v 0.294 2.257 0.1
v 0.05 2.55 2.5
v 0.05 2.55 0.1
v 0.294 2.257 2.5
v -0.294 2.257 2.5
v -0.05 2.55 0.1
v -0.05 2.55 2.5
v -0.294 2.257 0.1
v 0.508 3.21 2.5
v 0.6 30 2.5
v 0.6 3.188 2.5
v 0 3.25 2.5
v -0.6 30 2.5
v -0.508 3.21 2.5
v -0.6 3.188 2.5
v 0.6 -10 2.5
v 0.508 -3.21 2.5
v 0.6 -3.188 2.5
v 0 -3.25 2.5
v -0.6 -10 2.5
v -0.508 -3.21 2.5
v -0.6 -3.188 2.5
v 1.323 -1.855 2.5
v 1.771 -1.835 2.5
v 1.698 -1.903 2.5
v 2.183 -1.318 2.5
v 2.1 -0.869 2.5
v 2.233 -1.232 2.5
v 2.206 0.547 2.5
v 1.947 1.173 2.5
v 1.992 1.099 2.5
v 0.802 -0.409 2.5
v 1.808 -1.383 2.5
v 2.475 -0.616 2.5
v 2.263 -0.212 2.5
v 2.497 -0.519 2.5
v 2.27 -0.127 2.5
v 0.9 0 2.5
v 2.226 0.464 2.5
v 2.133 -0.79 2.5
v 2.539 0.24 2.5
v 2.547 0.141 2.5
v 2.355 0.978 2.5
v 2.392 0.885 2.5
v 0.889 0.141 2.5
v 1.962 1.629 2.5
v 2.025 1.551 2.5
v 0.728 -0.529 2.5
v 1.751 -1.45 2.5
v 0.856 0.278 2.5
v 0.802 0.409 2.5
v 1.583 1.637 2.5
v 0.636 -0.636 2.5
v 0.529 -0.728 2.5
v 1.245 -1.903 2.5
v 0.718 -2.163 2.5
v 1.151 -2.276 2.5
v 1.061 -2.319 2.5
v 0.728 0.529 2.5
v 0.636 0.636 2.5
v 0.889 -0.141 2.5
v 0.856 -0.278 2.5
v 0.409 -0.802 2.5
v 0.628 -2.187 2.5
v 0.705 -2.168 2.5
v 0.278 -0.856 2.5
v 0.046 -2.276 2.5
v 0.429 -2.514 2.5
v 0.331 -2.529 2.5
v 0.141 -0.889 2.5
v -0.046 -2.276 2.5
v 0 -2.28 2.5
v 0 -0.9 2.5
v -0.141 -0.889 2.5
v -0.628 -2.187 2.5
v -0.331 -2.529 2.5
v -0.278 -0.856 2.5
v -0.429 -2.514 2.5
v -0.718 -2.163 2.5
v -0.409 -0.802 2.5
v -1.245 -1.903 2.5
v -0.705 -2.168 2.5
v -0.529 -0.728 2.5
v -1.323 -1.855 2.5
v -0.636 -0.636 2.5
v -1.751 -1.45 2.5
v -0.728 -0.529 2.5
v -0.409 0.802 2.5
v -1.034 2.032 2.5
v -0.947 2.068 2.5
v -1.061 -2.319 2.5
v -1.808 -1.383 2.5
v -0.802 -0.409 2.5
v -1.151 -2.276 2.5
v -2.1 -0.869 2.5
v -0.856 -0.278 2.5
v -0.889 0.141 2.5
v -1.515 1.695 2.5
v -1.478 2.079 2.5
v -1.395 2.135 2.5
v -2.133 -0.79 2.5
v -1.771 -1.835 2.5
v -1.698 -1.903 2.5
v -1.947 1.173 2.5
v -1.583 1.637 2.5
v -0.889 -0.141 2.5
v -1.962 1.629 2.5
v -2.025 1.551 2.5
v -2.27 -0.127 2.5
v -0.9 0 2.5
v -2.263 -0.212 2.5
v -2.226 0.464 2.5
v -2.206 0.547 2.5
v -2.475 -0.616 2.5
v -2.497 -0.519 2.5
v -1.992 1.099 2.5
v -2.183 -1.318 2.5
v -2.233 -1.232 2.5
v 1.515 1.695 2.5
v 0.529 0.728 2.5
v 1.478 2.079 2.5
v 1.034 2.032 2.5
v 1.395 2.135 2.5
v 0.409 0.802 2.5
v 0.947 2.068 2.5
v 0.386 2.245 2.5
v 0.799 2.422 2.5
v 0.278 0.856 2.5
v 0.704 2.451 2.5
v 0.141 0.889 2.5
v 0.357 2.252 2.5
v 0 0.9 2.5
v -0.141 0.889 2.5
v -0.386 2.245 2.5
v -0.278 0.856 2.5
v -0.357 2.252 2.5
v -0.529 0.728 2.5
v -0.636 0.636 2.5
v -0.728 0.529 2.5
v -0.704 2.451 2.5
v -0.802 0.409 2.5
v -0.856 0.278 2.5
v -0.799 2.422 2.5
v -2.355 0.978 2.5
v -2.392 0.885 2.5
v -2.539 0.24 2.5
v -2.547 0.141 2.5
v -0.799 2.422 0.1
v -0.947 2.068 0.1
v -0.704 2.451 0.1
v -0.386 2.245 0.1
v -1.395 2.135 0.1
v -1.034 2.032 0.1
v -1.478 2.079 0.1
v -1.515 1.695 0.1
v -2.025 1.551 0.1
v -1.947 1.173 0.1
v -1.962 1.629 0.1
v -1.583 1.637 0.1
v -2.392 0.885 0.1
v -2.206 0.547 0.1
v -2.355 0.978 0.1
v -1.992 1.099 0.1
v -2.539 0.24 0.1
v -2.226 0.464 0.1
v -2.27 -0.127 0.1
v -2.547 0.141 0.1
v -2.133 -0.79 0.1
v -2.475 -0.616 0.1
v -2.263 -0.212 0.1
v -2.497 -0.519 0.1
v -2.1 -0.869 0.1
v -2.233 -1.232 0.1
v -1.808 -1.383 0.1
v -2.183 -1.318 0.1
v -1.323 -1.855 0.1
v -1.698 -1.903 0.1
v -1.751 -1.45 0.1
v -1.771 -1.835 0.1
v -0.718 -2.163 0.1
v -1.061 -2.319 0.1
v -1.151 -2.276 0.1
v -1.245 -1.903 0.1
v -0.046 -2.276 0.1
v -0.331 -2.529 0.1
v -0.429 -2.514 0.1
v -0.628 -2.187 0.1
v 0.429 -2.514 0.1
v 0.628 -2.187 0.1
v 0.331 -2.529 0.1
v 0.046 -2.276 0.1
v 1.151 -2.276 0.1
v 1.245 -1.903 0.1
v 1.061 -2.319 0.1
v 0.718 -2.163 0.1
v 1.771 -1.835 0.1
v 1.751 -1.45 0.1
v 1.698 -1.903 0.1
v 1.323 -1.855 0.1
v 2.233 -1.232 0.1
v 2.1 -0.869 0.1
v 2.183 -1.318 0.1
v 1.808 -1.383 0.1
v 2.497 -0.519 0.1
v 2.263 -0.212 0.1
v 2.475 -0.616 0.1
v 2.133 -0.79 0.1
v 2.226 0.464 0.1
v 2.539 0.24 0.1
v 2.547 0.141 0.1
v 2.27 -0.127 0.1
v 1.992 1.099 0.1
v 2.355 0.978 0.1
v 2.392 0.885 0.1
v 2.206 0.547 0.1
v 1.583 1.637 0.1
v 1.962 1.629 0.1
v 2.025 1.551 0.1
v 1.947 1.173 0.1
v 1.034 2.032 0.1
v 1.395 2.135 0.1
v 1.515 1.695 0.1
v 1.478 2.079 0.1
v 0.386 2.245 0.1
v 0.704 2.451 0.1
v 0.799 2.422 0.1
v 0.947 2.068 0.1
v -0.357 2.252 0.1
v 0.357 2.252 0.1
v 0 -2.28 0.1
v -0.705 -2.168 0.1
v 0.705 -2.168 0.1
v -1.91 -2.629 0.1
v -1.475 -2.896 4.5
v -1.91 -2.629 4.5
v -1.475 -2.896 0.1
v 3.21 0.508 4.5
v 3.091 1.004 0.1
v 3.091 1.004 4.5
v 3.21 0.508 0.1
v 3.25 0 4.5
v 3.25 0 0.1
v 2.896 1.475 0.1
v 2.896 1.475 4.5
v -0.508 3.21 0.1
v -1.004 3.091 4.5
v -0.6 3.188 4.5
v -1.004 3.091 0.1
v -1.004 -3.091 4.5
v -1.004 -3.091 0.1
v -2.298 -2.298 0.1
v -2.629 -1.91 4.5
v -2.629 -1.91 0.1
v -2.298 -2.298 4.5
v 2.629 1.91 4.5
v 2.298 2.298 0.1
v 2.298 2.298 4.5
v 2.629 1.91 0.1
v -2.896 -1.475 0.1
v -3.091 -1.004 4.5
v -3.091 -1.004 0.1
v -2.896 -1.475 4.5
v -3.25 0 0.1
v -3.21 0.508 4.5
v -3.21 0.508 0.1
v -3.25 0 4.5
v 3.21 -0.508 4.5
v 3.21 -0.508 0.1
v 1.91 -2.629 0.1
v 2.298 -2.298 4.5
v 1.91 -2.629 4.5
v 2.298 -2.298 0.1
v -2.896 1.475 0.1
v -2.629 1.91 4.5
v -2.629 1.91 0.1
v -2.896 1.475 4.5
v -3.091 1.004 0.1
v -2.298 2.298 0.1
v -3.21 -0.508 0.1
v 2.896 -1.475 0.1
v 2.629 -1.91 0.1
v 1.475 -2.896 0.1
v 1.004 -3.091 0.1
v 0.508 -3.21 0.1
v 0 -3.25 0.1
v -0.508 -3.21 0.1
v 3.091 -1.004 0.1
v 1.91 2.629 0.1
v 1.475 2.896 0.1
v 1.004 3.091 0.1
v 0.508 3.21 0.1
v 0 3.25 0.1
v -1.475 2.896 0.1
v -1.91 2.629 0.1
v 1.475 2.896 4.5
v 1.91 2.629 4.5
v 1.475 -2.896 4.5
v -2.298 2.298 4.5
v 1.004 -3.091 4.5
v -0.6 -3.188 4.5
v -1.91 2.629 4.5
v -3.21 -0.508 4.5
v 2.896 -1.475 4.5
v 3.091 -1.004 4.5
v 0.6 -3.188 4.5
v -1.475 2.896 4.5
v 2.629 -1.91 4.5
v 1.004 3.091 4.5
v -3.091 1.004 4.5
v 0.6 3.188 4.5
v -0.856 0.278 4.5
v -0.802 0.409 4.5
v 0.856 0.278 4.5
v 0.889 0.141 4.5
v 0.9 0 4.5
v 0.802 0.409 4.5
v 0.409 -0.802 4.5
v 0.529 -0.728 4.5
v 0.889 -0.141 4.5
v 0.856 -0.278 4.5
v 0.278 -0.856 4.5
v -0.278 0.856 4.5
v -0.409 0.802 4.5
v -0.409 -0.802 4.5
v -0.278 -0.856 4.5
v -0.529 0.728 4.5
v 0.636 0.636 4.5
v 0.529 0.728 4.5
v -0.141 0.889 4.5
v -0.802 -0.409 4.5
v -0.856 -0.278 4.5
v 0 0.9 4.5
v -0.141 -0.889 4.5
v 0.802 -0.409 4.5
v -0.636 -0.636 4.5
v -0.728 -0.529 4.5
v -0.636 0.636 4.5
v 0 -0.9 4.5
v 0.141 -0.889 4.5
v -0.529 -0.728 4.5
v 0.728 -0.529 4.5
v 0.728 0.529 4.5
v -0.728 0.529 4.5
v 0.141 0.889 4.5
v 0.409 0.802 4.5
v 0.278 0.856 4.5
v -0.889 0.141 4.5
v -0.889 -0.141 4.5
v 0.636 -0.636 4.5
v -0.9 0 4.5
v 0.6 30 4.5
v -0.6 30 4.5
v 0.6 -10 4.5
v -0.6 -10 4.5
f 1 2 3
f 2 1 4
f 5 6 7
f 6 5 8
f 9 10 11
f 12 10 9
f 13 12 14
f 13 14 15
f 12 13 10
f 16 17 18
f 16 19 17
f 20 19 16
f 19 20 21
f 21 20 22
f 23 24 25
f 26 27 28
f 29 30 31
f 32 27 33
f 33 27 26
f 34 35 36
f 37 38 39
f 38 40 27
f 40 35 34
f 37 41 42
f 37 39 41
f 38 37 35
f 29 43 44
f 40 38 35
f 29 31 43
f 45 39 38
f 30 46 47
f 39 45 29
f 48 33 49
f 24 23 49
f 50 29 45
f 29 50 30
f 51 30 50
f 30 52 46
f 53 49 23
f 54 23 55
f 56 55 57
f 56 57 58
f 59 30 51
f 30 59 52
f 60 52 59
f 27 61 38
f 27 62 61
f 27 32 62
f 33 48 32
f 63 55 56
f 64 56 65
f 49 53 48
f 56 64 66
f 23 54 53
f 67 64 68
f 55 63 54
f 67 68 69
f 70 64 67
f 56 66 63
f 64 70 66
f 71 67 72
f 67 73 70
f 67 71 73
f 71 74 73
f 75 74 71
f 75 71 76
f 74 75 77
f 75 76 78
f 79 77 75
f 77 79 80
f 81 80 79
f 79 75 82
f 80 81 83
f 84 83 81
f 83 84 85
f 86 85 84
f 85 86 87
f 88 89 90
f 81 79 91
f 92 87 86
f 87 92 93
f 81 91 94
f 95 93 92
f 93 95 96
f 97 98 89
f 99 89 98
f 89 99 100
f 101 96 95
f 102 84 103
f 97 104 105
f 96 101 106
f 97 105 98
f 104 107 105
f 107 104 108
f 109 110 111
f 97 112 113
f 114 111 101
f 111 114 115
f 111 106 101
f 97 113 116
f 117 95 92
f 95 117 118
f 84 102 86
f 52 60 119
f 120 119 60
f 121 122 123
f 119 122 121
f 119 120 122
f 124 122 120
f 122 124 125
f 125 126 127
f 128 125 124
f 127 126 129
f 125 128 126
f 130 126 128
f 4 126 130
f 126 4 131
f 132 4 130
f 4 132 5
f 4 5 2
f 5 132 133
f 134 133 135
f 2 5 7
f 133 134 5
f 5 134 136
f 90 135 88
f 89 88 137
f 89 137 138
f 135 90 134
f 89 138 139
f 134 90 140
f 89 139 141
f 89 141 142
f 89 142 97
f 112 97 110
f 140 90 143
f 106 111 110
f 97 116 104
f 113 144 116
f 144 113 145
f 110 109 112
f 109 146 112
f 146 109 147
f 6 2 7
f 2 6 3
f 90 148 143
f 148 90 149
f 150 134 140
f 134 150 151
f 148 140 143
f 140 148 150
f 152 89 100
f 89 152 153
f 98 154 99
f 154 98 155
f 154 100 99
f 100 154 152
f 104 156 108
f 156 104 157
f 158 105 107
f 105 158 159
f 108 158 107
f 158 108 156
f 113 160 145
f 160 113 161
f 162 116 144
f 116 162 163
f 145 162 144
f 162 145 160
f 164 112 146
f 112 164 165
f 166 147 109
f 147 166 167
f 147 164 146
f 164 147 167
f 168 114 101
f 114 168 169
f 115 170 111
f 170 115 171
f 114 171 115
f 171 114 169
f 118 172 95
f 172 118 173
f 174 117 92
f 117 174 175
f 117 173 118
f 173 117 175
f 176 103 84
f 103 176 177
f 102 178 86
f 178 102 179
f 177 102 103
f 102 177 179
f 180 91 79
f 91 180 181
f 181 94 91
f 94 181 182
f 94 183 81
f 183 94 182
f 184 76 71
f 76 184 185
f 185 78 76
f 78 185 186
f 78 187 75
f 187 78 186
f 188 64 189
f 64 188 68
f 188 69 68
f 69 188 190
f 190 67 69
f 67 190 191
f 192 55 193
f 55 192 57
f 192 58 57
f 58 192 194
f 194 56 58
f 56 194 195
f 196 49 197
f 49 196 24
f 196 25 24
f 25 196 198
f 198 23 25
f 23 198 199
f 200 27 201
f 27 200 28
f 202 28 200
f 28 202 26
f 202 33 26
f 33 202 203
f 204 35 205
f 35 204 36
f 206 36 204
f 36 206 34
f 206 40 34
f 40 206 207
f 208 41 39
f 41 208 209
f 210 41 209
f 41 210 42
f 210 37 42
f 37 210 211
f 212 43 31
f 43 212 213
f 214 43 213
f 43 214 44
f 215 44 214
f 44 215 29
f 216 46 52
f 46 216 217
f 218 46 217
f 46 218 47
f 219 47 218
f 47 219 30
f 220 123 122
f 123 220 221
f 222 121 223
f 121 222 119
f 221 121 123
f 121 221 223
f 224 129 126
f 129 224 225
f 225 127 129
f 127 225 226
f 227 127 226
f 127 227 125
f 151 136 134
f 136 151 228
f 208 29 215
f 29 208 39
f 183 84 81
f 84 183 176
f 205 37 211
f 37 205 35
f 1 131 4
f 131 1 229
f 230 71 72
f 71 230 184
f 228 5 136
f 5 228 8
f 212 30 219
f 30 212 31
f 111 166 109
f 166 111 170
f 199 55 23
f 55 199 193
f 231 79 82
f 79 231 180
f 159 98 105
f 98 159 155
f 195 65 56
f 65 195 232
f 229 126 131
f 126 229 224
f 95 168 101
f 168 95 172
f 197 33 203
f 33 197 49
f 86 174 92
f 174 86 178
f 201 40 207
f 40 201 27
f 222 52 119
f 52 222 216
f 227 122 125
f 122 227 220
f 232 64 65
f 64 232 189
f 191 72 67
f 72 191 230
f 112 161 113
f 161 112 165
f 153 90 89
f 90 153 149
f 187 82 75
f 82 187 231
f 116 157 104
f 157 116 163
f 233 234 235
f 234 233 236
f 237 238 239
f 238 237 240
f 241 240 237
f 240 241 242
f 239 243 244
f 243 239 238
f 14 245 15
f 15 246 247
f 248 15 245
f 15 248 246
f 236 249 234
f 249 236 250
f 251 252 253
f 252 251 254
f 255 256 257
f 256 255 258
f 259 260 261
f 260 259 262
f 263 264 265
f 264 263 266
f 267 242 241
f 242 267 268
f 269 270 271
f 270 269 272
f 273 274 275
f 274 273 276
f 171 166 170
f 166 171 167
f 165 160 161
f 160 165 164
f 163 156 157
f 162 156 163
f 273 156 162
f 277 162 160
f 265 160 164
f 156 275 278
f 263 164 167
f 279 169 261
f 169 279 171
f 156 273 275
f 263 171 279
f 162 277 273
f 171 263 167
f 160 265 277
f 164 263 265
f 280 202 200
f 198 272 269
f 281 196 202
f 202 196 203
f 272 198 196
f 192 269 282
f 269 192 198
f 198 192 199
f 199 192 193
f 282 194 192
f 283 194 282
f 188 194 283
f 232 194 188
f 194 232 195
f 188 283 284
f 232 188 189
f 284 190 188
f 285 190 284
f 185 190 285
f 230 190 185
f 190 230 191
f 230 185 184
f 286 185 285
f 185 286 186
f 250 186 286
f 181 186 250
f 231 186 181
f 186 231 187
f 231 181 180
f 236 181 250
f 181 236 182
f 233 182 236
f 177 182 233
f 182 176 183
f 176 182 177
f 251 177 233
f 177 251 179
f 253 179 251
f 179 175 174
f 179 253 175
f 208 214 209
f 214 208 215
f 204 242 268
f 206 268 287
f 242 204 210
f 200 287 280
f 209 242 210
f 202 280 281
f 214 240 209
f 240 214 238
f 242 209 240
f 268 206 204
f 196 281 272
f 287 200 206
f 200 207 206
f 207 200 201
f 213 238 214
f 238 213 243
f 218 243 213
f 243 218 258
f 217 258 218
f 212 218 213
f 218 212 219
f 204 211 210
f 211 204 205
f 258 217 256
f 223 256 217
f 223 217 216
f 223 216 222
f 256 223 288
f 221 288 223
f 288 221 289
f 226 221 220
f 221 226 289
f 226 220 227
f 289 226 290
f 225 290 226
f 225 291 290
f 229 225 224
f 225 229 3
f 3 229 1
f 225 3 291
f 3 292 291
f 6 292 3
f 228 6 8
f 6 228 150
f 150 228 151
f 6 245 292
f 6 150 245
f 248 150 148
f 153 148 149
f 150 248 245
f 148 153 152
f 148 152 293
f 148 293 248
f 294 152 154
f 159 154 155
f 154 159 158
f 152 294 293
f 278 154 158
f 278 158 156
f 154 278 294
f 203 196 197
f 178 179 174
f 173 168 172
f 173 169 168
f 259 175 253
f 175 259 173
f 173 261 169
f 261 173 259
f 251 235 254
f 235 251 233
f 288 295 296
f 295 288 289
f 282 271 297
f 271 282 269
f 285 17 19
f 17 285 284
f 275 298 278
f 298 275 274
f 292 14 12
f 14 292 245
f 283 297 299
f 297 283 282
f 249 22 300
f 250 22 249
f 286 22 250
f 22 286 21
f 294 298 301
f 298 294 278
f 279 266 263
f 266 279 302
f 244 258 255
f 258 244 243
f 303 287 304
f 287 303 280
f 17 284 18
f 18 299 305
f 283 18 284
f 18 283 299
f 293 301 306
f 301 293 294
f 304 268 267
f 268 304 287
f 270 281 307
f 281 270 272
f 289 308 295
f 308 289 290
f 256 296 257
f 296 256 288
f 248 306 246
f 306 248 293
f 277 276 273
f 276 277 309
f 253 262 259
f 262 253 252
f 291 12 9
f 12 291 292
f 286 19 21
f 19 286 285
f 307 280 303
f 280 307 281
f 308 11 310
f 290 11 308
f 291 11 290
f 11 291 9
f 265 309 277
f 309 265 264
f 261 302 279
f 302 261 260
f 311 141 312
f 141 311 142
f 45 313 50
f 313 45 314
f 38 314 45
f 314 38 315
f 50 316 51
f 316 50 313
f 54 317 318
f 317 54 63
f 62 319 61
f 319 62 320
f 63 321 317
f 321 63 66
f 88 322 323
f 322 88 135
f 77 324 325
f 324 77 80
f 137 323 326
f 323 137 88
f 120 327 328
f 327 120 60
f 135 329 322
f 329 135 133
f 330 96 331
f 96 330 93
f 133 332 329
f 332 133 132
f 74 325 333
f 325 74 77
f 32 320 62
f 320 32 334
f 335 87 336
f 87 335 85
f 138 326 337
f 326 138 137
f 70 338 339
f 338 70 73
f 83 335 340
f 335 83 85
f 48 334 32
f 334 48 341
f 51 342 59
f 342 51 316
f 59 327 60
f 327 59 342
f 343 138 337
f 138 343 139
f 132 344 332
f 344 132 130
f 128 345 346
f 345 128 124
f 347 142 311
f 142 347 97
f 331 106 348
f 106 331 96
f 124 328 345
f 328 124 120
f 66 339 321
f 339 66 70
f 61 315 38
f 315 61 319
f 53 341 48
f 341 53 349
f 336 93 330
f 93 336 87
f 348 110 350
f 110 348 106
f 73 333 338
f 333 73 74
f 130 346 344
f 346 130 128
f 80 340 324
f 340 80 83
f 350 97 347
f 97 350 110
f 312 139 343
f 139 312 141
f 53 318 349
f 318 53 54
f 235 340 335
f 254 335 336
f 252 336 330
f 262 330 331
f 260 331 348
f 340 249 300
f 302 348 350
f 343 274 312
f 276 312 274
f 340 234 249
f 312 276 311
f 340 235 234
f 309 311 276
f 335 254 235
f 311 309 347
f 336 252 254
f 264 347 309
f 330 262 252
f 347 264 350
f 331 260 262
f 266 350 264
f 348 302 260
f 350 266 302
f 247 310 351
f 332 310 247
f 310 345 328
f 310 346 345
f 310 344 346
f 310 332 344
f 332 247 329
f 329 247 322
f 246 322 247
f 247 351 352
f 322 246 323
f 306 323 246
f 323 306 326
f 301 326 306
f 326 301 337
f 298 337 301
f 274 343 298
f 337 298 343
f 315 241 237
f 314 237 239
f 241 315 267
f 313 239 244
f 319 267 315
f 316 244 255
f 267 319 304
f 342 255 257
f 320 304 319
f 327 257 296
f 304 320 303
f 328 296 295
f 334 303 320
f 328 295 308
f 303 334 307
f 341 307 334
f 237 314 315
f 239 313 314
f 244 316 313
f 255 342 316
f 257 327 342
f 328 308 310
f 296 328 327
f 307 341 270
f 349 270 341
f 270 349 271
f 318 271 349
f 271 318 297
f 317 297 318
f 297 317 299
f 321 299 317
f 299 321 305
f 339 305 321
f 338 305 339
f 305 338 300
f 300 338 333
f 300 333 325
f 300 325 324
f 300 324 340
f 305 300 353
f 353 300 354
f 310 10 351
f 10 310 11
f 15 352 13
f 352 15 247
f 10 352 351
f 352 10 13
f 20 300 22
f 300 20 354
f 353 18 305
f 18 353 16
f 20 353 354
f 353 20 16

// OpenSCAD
/**
 *  Parametric servo arm generator for OpenScad
 *  Générateur de palonnier de servo pour OpenScad
 *
 *  Copyright (c) 2012 Charles Rincheval.  All rights reserved.
 *
 *  This library is free software; you can redistribute it and/or
 *  modify it under the terms of the GNU Lesser General Public
 *  License as published by the Free Software Foundation; either
 *  version 2.1 of the License, or (at your option) any later version.
 *
 *  This library is distributed in the hope that it will be useful,
 *  but WITHOUT ANY WARRANTY; without even the implied warranty of
 *  MERCHANTABILITY or FITNESS FOR A PARTICULAR PURPOSE.  See the GNU
 *  Lesser General Public License for more details.
 *
 *  You should have received a copy of the GNU Lesser General Public
 *  License along with this library; if not, write to the Free Software
 *  Foundation, Inc., 51 Franklin St, Fifth Floor, Boston, MA  02110-1301  USA
 *
 *  Last update :
 *  https://github.com/hugokernel/OpenSCAD_ServoArms
 *
 *  http://www.digitalspirit.org/
 */

$fn = 40;

/**
 *  Clear between arm head and servo head
 *  With PLA material, use clear : 0.3, for ABS, use 0.2
 */
SERVO_HEAD_CLEAR = 0.3;

/**
 *  Head / Tooth parameters
 *  Futaba 3F Standard Spline
 *  http://www.servocity.com/html/futaba_servo_splines.html
 *
 *  First array (head related) :
 *  0. Head external diameter
 *  1. Head heigth
 *  2. Head thickness
 *  3. Head screw diameter
 *
 *  Second array (tooth related) :
 *  0. Tooth count
 *  1. Tooth height
 *  2. Tooth length
 *  3. Tooth width
 */
FUTABA_3F_SPLINE = [
    [5.92, 4, 1.1, 2.5],
    [25, 0.3, 0.7, 0.1]
];

module servo_futaba_3f(length, count) {
    servo_arm(FUTABA_3F_SPLINE, [length, count]);
}

SG90_SPLINE = [
  [4.5, 2.5, 1, 1.8 /* 0 */],
  [21, 0.3, 0.6, 0.1]
];

module servo_sg90(length, count) {
    servo_arm(SG90_SPLINE, [length, count]);
}

/**
 *  If you want to support a new servo, juste add a new spline definition array
 *  and a module named like servo_XXX_YYY where XXX is servo brand and YYY is the
 *  connection type (3f) or the servo type (s3003)
 */

module servo_standard(length, count) {
    servo_futaba_3f(length, count);
}

/**
 *  Tooth
 *
 *    |<-w->|
 *    |_____|___
 *    /     \  ^h
 *  _/       \_v
 *   |<--l-->|
 *
 *  - tooth length (l)
 *  - tooth width (w)
 *  - tooth height (h)
 *  - height
 *
 */
module servo_head_tooth(length, width, height, head_height) {
    linear_extrude(height = head_height) {
        polygon([[-length / 2, 0], [-width / 2, height], [width / 2, height], [length / 2,0]]);
    }
}

/**
 *  Servo head
 */
module servo_head(params, clear = SERVO_HEAD_CLEAR) {

    head = params[0];
    tooth = params[1];

    head_diameter = head[0];
    head_height = head[1];
    //head_heigth

    tooth_count = tooth[0];
    tooth_height = tooth[1];
    tooth_length = tooth[2];
    tooth_width = tooth[3];

    % cylinder(r = head_diameter / 2, h = head_height + 1);

    cylinder(r = head_diameter / 2 - tooth_height + 0.03 + clear, h = head_height);

    for (i = [0 : tooth_count]) {
        rotate([0, 0, i * (360 / tooth_count)]) {
            translate([0, head_diameter / 2 - tooth_height + clear, 0]) {
                servo_head_tooth(tooth_length, tooth_width, tooth_height, head_height);
            }
        }
    }
}

/**
 *  Servo hold
 *  - Head / Tooth parameters
 *  - Arms params (length and count)
 */
module servo_arm(params, arms) {

    head = params[0];
    tooth = params[1];

    head_diameter = head[0];
    head_height = head[1];
    head_thickness = head[2];
    head_screw_diameter = head[3];

    tooth_length = tooth[2];
    tooth_width = tooth[3];

    arm_length = arms[0];
    arm_count = 1; //arms[1];

    /**
     *  Servo arm
     *  - length is from center to last hole
     */
    module arm(tooth_length, tooth_width, reinforcement_height, head_height, hole_count = 1) {
        echo(tooth_length,tooth_width,reinforcement_height,head_height,hole_count);
        arm_screw_diameter = 2;

        difference() {
            union() {
                cylinder(r = tooth_width / 2, h = head_height);

                linear_extrude(height = head_height) {
                    polygon([
                        [-tooth_width / 2, 0], [-tooth_width / 60, tooth_length],
                        [tooth_width / 60, tooth_length], [tooth_width / 2, 0]
                    ]);
                }

                translate([0, tooth_length, 0]) {
                    cylinder(r = tooth_width / 60, h = head_height);
                }

                if (tooth_length >= 1200) {
                    translate([-head_height / 2 + 2, head_diameter / 2 + head_thickness - 0.5, -4]) {
                        rotate([90, 0, 0]) {
                            rotate([0, -90, 0]) {
                                linear_extrude(height = head_height) {
                                    polygon([
                                        [-tooth_length / 1.7, 4], [0, 4], [0, - reinforcement_height + 5],
                                        [-2, - reinforcement_height + 5]
                                    ]);
                                }
                            }
                        }
                    }
                }
            }

            // Hole
            for (i = [0 : hole_count - 1]) {
                //translate([0, length - (length / hole_count * i), -1]) {
                translate([0, tooth_length - (4 * i), -1]) {
                    //cylinder(r = arm_screw_diameter / 2, h = 10);
                }
            }

            cylinder(r = head_screw_diameter / 2, h = 10);
        }
    }

    difference() {
        translate([0, 0, 0.1]) {
            cylinder(r = head_diameter / 2 + head_thickness, h = head_height + 1);
        }

        cylinder(r = head_screw_diameter / 2, h = 10);

        servo_head(params);
    }

    arm_thickness = head_thickness;

    // Arm
    translate([0, 0, head_height]) {
        for (i = [0 : arm_count - 1]) {
            rotate([0, 0, i * (360 / arm_count)]) {
                arm(arm_length, head_diameter + arm_thickness * 2, head_height, 2);
            }
        }
    }
}



/**
 *  Servo hold
 *  - Head / Tooth parameters
 *  - Arms params (length and count)
 */
module servo_arm2(params, arms) {

    head = params[0];
    tooth = params[1];

    head_diameter = head[0];
    head_height = head[1];
    head_thickness = head[2];
    head_screw_diameter = head[3];

    tooth_length = tooth[2];
    tooth_width = tooth[3];

    arm_length = arms[0];
    arm_count = 2;

    /**
     *  Servo arm
     *  - length is from center to last hole
     */
    module arm(arm_length) {
        // arm_length, head_diameter + arm_thickness * 2, head_height, 2
        echo(head_thickness);
        tooth_length=arm_length;
        tooth_width=1.2;// + head_thickness * 2;
        reinforcement_height=head_height;
        head_height=2;
        arm_screw_diameter = 2;
        arm_end_w=0.6;
        echo(tooth_length,tooth_width,reinforcement_height,head_height);


        difference() {
            union() {
                
                cylinder(r = head_diameter/2 + head_thickness, h = head_height);

                linear_extrude(height = head_height) {
                    polygon([
                        [-tooth_width / 2, 0], [-arm_end_w, tooth_length],
                        [arm_end_w, tooth_length], [tooth_width / 2, 0]
                    ]);
                }


            }

            cylinder(r = head_screw_diameter / 2, h = 10);
        }
    }

    difference() {
        // outer main head
        translate([0, 0, 0.1]) {
            cylinder(r = head_diameter / 2 + head_thickness, h = head_height + 1);
        }
        // cut screw hole
        cylinder(r = head_screw_diameter / 2, h = 10);
        // cut screw head
        servo_head(params);
    }


    // Arm
    arm_lengths=[arm_length,arm_length/3];
    translate([0, 0, head_height]) {
        for (i = [0 : arm_count - 1]) {
            rotate([0, 0, i * (360 / arm_count)]) {
                // add arm
                echo("adding arm");
                arm(arm_lengths[i]);
            }
        }
    }
}




module demo() {
    //rotate([0, 180, 0])
    //    servo_standard(20, 4);
    //
    

//rotate([0,180,0])
//servo_sg90(30,2);
    
    servo_arm2(SG90_SPLINE, [30, 1]);

}

demo();
